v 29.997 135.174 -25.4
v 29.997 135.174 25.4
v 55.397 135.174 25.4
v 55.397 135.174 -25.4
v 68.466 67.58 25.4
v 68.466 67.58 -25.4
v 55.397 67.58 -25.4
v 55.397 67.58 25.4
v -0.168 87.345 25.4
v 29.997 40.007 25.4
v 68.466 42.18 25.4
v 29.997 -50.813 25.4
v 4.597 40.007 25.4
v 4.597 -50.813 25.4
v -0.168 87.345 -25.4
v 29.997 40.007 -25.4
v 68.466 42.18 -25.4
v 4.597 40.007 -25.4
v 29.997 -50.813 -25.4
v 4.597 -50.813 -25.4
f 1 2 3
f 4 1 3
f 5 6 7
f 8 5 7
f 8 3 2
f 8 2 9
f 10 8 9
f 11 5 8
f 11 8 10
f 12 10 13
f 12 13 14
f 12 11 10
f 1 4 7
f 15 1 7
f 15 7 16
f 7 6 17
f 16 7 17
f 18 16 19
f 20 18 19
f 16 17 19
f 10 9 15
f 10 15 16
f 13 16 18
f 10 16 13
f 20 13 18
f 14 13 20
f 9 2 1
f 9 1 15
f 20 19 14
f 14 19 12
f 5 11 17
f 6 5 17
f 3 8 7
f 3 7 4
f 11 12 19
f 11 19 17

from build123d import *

# Parameters (mm, degrees)
F1_DEPTH = 25.4
F2_DEPTH = 25.4
F3_DEPTH = 25.4
F4_DEPTH = 25.4
F5_DEPTH = 25.4


with BuildPart() as f1:
    # F0 (on Top) → F1 (new body)
    with BuildSketch(Plane.XY):
        Polygon((29.9969874322, 40.0068945546), (29.9969874322, 6.1151932525), (51.8570691347, 5.7021006942), align=None)
        Polygon((51.8570691347, 5.7021006942), (29.9969874322, 6.1151932525), (29.9969874322, -50.8127212524), (68.4659332037, 42.1804785728), (29.9969874322, 42.1804785728), (29.9969874322, 40.0068945546), align=None)
        Polygon((-0.1684613526, 87.345212698), (29.9969874322, 40.0068945546), (29.9969874322, 42.1804785728), (29.9969874322, 135.1736783981), align=None)
    extrude(amount=F1_DEPTH)

    # F2 (add): a face of the model
    f2_faces = [f1.faces().sort_by_distance(p)[0] for p in [
        (29.9969874322, 88.6770784855, 12.7),
    ]]
    extrude(f2_faces, amount=F2_DEPTH)

    # F3 (add): a face of the model
    f3_faces = [f1.faces().sort_by_distance(p)[0] for p in [
        (36.8893007779, 63.5629589231, 0),
    ]]
    extrude(f3_faces, amount=F3_DEPTH)

    # F4 (add): a face of the model
    f4_faces = [f1.faces().sort_by_distance(p)[0] for p in [
        (61.931460318, 42.1804785728, 0),
    ]]
    extrude(f4_faces, amount=F4_DEPTH)

    # F5 (add): a face of the model
    f5_faces = [f1.faces().sort_by_distance(p)[0] for p in [
        (29.9969874322, -5.4029133489, 0),
    ]]
    extrude(f5_faces, amount=F5_DEPTH)


solid = f1.part
